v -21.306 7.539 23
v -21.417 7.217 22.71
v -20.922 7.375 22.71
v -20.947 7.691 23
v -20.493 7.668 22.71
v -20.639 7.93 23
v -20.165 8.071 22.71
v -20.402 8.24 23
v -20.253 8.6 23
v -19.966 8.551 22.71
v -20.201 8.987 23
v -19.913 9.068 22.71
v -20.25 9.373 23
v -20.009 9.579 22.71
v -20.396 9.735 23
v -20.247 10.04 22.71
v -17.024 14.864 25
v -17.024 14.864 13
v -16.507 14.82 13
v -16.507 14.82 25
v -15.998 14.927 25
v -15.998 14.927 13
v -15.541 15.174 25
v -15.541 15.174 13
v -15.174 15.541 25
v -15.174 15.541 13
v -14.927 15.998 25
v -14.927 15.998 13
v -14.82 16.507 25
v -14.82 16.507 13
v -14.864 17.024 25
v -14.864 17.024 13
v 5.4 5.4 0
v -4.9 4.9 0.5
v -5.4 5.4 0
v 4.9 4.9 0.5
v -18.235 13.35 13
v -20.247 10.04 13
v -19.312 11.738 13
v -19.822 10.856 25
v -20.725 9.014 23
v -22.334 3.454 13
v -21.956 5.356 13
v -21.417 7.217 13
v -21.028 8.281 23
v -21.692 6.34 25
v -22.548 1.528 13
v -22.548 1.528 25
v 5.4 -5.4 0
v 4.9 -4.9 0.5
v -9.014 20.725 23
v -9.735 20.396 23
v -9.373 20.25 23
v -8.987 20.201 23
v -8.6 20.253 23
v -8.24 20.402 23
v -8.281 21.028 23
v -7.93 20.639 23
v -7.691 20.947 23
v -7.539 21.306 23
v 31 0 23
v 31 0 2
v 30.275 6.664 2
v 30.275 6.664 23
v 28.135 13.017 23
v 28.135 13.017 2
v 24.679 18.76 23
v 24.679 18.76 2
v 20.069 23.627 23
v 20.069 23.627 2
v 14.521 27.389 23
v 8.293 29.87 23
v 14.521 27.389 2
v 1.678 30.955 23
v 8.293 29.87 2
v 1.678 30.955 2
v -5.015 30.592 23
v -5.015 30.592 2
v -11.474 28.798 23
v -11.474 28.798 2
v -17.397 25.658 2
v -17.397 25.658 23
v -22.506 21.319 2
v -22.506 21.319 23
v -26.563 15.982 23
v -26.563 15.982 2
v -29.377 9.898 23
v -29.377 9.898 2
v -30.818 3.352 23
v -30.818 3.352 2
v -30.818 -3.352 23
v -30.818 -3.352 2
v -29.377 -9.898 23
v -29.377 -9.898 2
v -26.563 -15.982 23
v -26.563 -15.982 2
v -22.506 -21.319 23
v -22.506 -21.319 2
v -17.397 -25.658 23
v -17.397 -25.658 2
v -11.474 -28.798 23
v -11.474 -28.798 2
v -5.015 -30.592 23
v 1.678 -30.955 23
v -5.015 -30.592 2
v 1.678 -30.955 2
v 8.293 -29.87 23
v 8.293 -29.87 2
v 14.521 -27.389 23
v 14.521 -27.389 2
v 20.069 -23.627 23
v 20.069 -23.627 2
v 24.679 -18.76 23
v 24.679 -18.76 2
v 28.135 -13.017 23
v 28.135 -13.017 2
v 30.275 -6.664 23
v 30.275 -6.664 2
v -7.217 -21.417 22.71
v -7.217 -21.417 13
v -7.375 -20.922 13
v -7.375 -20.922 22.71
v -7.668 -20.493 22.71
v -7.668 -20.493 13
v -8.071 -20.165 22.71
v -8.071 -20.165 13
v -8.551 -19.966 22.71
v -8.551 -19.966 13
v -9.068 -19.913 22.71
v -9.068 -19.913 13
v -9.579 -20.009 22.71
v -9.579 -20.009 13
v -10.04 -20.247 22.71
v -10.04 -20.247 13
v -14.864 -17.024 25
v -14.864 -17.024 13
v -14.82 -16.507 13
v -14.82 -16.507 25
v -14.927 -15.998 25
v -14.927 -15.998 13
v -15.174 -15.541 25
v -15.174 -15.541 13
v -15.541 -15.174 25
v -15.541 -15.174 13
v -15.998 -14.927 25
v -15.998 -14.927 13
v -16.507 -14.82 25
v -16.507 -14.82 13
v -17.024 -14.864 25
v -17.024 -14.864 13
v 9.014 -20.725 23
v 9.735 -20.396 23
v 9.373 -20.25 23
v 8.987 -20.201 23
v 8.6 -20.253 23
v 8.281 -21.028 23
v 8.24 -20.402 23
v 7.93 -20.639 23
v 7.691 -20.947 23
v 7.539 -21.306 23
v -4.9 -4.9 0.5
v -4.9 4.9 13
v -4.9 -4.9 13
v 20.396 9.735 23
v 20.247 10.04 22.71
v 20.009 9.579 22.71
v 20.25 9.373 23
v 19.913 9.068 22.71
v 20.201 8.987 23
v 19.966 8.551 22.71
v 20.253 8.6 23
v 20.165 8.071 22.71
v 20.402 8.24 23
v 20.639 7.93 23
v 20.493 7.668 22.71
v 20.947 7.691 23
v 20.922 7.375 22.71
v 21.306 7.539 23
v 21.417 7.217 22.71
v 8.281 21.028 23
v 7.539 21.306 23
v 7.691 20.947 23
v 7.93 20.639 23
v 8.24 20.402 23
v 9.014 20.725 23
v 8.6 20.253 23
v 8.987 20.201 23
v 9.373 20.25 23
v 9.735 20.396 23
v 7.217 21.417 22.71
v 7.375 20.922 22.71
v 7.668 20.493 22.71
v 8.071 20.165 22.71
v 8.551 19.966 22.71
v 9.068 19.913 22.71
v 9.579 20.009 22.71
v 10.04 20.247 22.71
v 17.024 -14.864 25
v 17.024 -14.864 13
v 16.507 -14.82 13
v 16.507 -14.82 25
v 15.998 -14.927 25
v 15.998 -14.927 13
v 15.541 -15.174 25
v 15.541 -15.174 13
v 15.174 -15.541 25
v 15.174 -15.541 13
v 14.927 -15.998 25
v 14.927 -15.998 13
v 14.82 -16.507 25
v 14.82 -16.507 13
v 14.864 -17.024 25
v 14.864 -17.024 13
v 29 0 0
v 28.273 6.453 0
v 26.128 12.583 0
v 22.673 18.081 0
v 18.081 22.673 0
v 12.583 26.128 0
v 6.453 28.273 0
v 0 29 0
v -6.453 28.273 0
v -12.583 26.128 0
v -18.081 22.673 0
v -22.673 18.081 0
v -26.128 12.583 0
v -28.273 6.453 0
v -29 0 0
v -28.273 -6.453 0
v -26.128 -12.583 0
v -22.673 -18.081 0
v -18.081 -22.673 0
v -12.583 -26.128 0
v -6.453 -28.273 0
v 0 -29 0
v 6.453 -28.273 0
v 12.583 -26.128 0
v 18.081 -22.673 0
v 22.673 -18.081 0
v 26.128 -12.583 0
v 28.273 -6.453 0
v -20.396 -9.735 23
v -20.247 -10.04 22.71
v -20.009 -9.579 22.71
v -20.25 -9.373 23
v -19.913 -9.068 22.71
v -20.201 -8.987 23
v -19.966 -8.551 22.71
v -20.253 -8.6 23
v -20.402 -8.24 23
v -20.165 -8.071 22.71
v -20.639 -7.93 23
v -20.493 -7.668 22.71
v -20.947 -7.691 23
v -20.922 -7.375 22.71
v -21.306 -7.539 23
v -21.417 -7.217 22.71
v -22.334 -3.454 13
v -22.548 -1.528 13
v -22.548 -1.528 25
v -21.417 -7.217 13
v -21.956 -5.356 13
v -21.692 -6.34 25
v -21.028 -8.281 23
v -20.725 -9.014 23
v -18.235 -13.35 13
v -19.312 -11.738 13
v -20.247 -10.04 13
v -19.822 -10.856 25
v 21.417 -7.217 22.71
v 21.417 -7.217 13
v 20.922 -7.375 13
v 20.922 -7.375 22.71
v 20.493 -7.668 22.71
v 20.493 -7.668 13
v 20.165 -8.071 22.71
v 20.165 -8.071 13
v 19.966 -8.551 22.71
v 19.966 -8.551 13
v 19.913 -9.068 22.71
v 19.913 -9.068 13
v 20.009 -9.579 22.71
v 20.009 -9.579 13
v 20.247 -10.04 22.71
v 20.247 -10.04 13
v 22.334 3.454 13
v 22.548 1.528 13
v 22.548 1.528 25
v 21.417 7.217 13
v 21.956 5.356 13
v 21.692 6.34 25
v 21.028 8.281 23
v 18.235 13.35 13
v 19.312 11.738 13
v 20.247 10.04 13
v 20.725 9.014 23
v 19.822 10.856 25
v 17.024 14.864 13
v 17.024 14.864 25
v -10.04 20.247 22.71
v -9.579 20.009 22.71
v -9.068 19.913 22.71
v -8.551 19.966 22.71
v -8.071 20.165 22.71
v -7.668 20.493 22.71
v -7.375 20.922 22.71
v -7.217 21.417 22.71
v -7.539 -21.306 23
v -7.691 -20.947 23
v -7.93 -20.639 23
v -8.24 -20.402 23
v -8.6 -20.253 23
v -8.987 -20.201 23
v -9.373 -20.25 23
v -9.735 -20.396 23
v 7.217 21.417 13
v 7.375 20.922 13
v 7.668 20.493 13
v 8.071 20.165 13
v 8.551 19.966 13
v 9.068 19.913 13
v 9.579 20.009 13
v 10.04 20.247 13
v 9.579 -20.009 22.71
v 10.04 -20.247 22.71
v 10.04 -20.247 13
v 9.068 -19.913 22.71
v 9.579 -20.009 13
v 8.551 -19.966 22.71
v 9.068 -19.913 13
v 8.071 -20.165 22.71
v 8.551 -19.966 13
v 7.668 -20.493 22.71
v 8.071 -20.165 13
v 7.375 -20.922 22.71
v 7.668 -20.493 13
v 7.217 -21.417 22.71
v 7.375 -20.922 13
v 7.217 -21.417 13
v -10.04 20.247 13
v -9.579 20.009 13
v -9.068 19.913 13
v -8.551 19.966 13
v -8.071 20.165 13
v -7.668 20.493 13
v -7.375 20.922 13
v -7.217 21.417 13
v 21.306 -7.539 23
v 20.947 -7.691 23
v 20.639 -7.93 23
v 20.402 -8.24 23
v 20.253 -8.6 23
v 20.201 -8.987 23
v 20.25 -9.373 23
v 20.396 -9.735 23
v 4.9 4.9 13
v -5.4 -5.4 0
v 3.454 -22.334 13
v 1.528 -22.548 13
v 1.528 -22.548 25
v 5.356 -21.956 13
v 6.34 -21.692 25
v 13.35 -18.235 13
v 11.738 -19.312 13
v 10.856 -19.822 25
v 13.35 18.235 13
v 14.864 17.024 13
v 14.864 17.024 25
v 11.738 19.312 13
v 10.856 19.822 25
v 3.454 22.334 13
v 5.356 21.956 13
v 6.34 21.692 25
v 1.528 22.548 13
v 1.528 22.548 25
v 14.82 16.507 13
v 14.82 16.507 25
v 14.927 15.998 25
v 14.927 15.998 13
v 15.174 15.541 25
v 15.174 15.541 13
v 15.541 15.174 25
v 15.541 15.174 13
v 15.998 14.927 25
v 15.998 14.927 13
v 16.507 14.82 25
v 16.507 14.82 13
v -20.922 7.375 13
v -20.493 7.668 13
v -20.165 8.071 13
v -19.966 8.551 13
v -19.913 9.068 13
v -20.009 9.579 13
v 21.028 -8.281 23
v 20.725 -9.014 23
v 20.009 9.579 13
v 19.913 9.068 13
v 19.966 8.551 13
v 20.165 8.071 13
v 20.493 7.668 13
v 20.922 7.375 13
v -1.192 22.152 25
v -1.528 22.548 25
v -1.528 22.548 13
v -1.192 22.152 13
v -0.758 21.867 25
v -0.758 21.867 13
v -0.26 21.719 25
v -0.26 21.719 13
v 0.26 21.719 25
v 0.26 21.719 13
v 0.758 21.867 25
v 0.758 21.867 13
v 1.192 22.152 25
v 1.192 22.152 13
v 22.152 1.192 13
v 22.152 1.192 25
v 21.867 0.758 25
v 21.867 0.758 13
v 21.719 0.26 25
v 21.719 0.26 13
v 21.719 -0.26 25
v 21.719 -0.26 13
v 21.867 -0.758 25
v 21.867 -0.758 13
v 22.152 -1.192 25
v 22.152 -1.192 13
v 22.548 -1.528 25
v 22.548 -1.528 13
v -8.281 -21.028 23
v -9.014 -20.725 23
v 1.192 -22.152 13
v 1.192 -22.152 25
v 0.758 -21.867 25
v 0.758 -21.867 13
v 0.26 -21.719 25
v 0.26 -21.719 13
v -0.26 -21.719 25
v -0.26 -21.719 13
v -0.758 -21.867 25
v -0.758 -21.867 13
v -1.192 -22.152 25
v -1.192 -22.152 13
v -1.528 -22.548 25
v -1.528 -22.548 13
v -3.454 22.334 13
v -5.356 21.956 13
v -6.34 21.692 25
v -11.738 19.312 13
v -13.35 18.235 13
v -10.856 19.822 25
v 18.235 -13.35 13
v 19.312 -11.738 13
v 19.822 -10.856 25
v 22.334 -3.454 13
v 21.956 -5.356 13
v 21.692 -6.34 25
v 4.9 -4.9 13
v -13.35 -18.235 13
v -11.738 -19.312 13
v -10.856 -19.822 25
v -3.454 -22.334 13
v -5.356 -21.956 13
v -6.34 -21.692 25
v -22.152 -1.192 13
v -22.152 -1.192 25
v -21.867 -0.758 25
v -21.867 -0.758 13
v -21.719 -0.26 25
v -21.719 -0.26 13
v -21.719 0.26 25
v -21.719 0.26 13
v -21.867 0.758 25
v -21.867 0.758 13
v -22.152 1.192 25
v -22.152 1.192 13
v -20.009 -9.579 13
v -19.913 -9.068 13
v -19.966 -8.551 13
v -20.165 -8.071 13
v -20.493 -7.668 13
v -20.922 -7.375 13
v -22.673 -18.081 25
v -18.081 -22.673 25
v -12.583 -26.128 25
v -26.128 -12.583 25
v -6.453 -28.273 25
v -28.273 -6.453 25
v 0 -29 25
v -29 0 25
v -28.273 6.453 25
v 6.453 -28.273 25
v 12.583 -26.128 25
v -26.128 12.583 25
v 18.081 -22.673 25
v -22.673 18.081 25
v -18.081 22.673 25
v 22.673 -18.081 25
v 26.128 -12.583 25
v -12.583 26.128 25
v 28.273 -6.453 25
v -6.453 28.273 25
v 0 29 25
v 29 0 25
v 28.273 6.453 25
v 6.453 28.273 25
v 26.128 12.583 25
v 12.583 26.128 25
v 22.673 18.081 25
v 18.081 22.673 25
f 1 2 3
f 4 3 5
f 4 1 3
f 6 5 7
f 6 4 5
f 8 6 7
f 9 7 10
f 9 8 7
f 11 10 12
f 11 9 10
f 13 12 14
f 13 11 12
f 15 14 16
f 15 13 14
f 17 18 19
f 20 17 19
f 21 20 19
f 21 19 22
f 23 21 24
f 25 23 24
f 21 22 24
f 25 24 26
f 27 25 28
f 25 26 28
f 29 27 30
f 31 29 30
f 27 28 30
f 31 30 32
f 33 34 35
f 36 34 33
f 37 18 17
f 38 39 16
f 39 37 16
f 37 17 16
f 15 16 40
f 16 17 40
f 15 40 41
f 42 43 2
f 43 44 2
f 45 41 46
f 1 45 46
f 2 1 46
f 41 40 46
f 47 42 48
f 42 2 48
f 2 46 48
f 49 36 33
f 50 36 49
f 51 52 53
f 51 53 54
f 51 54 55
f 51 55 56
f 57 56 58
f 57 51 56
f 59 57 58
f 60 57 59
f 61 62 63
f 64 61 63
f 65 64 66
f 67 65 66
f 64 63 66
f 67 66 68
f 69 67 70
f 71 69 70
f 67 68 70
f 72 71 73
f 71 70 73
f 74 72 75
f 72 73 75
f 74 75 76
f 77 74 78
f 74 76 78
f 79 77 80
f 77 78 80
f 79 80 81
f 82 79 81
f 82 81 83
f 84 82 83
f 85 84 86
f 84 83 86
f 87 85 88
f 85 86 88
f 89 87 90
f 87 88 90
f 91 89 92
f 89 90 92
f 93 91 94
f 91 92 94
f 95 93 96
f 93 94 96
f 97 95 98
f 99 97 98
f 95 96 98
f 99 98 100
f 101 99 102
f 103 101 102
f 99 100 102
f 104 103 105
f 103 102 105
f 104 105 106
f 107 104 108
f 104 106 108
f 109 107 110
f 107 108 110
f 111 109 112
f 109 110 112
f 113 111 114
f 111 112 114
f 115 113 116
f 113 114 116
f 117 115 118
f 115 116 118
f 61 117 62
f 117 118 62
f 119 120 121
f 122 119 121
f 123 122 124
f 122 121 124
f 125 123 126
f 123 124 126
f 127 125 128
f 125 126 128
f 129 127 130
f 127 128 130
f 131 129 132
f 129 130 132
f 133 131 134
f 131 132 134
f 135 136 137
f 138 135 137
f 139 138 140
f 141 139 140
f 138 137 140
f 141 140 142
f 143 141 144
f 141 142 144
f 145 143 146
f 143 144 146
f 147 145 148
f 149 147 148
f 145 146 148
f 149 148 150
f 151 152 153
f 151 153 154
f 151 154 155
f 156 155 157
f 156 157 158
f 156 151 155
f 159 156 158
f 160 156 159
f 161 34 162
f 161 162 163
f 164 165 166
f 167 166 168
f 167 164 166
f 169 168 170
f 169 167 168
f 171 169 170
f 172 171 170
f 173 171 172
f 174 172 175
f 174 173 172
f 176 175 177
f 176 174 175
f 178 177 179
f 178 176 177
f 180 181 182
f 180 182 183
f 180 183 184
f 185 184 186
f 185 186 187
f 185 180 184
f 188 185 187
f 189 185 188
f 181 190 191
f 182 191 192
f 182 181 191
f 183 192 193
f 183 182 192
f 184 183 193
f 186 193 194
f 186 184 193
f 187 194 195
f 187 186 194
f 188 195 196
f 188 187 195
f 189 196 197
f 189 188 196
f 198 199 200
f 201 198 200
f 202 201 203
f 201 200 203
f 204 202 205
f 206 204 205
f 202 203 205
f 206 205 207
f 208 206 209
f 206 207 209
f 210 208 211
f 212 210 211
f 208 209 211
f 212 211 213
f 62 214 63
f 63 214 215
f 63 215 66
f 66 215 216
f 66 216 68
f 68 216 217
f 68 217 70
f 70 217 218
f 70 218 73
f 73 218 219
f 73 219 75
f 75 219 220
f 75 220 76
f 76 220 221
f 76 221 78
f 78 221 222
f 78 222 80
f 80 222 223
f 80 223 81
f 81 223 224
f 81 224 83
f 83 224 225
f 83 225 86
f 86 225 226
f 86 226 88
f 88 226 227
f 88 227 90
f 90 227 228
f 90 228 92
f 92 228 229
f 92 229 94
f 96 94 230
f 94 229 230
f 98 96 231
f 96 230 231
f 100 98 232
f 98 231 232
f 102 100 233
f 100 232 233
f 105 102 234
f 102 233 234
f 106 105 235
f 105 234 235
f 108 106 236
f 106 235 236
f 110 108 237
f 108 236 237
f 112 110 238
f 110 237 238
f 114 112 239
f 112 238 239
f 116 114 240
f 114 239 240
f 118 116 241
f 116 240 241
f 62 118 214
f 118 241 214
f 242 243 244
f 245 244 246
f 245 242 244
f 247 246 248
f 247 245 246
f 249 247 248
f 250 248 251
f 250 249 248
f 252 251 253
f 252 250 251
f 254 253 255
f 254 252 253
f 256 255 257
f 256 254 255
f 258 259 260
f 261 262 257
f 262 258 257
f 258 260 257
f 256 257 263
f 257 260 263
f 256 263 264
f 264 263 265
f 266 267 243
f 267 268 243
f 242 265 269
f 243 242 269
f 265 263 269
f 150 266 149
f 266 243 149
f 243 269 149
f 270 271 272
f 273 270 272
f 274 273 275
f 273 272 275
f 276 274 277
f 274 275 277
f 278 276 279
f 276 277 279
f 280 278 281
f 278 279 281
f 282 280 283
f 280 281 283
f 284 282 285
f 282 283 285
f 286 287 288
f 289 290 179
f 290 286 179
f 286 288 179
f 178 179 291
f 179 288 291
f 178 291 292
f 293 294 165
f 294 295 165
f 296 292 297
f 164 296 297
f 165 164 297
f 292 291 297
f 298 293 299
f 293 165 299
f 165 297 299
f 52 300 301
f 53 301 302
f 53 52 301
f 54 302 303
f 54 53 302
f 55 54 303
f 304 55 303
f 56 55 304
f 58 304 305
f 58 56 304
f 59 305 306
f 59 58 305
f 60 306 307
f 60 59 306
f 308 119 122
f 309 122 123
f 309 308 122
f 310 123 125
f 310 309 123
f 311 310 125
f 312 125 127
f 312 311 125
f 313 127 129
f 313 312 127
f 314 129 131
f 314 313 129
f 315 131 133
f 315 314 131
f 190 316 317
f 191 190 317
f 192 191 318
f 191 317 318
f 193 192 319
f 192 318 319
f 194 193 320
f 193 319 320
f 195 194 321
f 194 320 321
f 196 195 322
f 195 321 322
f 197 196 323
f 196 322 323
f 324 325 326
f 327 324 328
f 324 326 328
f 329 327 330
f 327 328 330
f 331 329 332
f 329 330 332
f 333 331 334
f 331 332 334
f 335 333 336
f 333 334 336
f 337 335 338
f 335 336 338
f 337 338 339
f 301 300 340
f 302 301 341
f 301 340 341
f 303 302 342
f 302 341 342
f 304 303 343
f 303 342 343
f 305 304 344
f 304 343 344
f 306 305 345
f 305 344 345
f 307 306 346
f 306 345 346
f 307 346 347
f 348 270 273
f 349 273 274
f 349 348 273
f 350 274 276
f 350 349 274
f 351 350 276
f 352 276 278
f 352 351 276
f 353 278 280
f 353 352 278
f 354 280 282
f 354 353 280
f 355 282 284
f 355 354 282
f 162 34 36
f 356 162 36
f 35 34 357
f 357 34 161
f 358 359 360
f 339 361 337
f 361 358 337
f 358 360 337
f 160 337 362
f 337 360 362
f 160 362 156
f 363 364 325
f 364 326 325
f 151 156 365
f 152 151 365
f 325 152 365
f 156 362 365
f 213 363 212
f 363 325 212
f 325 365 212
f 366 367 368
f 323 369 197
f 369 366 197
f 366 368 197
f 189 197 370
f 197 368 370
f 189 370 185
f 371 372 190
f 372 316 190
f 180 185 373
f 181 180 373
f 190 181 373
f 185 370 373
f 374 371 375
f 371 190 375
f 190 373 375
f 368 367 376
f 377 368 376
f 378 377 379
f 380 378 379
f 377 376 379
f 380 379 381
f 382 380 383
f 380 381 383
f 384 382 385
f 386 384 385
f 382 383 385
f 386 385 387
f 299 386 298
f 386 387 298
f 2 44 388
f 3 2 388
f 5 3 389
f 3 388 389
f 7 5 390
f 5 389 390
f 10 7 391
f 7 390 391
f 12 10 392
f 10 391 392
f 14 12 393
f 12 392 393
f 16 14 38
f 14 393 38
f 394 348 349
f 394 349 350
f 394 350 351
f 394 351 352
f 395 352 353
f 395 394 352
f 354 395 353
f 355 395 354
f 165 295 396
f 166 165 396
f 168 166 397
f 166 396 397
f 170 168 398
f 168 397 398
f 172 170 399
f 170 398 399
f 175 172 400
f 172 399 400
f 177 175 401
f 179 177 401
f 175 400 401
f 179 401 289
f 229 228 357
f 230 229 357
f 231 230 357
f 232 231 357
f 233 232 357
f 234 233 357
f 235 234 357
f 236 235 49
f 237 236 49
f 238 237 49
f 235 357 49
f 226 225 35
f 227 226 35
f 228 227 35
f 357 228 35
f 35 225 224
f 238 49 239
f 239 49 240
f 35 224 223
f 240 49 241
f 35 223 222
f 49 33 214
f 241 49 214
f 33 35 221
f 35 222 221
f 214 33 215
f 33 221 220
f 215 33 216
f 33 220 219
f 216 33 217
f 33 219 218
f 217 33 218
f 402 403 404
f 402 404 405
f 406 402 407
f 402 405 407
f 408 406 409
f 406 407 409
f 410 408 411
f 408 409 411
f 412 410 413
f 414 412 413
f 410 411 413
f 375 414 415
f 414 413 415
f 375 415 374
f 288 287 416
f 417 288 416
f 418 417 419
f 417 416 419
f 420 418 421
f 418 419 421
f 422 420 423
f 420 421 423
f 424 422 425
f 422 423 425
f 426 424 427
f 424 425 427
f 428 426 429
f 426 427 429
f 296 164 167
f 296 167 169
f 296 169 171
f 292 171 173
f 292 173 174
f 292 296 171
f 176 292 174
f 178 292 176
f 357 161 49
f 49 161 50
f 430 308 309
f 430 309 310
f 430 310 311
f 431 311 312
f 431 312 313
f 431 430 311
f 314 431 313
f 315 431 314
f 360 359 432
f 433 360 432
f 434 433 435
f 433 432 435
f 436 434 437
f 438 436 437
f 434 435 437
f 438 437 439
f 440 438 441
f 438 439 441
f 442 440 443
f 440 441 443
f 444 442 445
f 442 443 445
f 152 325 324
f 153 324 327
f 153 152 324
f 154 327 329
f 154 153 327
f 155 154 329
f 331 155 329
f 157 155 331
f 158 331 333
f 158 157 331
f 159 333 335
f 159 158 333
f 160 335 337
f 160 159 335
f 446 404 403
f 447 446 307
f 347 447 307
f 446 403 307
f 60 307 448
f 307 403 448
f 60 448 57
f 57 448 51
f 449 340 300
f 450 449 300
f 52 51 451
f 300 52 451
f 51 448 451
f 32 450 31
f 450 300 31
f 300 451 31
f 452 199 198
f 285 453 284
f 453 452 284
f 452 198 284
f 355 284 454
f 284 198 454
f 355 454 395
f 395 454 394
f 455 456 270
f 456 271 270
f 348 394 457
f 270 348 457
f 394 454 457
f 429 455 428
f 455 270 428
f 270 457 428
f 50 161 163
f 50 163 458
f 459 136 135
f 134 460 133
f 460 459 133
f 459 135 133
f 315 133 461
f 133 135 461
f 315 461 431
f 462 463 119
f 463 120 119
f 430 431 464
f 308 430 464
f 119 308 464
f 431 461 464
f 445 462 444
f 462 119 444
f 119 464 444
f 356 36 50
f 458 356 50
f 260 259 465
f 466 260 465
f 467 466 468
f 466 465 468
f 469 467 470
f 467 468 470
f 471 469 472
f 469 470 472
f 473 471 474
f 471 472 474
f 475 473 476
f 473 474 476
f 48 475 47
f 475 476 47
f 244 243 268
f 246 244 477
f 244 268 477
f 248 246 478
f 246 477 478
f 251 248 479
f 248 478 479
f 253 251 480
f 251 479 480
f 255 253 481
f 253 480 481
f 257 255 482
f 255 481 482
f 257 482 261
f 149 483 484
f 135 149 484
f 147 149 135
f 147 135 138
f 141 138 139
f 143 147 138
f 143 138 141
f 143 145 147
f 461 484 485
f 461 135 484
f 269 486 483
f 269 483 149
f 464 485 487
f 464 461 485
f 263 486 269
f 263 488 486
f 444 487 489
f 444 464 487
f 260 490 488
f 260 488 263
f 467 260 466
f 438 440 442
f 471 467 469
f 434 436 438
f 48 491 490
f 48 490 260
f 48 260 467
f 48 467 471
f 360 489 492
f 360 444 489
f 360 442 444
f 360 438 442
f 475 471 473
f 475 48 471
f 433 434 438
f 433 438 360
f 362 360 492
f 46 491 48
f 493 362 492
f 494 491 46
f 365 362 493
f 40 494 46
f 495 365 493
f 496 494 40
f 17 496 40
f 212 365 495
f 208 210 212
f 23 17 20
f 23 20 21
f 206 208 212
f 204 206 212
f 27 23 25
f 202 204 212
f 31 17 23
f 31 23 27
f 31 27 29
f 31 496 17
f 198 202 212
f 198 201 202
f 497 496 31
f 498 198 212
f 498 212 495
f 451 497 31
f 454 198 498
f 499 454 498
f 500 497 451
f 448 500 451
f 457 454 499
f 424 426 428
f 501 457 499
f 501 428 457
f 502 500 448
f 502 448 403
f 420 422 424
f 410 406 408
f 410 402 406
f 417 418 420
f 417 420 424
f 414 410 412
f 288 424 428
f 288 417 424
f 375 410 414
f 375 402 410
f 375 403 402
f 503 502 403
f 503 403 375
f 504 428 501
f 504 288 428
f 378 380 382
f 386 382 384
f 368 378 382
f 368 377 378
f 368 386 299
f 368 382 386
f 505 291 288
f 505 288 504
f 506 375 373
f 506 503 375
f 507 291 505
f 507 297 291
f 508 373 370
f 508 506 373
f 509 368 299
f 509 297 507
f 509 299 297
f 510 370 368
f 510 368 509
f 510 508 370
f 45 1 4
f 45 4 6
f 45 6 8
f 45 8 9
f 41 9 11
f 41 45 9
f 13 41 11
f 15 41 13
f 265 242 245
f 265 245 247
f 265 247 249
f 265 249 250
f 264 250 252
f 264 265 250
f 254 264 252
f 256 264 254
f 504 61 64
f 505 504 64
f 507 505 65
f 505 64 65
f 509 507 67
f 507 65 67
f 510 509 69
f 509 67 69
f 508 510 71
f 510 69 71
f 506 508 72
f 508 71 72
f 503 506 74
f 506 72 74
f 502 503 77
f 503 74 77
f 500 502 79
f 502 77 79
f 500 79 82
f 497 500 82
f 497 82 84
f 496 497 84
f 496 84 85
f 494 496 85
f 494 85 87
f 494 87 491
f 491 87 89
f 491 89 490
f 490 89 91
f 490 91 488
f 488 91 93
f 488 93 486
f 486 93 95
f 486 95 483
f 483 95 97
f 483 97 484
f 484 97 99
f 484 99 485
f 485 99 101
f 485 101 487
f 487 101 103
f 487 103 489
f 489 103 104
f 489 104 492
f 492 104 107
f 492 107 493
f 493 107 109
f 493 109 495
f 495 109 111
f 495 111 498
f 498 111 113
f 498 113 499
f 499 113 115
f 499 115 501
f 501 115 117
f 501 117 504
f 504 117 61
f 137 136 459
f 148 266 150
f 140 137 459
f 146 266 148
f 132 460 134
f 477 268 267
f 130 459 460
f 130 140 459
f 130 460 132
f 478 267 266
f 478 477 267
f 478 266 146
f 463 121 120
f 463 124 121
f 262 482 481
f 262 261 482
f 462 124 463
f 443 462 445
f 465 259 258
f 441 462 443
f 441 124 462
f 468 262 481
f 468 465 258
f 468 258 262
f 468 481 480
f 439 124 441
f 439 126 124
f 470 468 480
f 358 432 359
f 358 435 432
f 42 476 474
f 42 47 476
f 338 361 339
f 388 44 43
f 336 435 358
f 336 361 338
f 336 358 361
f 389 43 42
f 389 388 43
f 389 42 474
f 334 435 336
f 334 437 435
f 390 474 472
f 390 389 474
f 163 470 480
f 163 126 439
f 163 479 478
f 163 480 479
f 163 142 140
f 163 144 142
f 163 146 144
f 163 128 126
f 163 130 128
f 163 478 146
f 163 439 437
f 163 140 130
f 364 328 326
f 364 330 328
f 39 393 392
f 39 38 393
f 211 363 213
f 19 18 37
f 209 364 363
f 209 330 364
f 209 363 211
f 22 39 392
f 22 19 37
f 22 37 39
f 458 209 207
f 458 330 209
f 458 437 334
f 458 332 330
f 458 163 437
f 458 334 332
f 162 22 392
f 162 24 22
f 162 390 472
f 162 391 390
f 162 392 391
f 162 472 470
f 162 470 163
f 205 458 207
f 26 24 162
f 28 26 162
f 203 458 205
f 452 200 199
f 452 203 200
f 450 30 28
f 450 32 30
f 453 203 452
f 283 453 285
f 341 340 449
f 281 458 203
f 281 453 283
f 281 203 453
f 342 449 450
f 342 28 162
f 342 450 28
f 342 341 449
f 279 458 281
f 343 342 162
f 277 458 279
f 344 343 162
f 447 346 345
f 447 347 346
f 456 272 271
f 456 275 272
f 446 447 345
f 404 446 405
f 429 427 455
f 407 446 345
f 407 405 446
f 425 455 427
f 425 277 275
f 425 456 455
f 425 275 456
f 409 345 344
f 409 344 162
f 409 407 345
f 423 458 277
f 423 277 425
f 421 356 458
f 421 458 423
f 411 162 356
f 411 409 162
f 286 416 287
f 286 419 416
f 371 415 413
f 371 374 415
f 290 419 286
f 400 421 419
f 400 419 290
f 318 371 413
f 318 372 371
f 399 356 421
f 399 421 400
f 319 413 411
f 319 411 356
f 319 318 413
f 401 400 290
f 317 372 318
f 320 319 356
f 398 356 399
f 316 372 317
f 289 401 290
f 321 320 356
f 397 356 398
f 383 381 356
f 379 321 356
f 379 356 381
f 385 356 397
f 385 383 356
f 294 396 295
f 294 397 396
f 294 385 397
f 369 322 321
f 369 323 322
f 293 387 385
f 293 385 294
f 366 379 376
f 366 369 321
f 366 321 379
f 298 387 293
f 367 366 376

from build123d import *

# Parameters (mm, degrees)
SKETCH_R              = 31
PAD_DEPTH             = 25
SKETCH001_R           = 22.6
POCKET_DEPTH          = 12
SKETCH003_W           = 9.8
SKETCH003_H           = 9.8
POCKET001_DEPTH       = 25.001
SKETCH004_R           = 1.8
PAD001_DEPTH          = 12
POLARPATTERN_COUNT    = 8
SKETCH005_R           = 1.8
PAD002_DEPTH          = 10
POLARPATTERN001_COUNT = 16
CHAMFER_SIZE          = 2
CHAMFER001_SIZE       = 2
CHAMFER002_SIZE       = 0.5
CHAMFER003_SIZE       = 0.29


with BuildPart() as part:
    # Sketch → Pad (new body)
    with BuildSketch(Plane.XY):
        Circle(SKETCH_R)
    extrude(amount=PAD_DEPTH)

    # Sketch001 → Pocket (cut)
    with BuildSketch(Plane.XY.offset(25)):
        Circle(SKETCH001_R)
    extrude(amount=-POCKET_DEPTH, mode=Mode.SUBTRACT)

    # Sketch003 → Pocket001 (cut, through all)
    with BuildSketch(Plane(origin=(0, 0, 0), x_dir=(1, 0, 0), z_dir=(0, 0, -1))):
        Rectangle(SKETCH003_W, SKETCH003_H)
    extrude(amount=-POCKET001_DEPTH, mode=Mode.SUBTRACT)

    # Sketch004 → Pad001 (new body)
    with BuildSketch(Plane.XY.offset(13)):
        with Locations((0, 23.5)):
            Circle(SKETCH004_R)
    pad001 = extrude(amount=PAD001_DEPTH)

    # PolarPattern: Pad001 ×8 about axis
    polarpattern_axis = Axis((0, 0, 13), (0, 0, 1))
    for i in range(1, POLARPATTERN_COUNT):
        add(pad001.rotate(polarpattern_axis, i * 360 / POLARPATTERN_COUNT))

    # Sketch005 → Pad002 (new body)
    with BuildSketch(Plane.XY.offset(13)):
        with Locations((0, 23.5)):
            Circle(SKETCH005_R)
    pad002 = extrude(amount=PAD002_DEPTH)

    # PolarPattern001: Pad002 ×16 about axis
    polarpattern001_axis = Axis((0, 0, 13), (0, 0, 1))
    for i in range(1, POLARPATTERN001_COUNT):
        add(pad002.rotate(polarpattern001_axis, i * 360 / POLARPATTERN001_COUNT))

    # Chamfer
    chamfer_edges = [part.edges().sort_by_distance(p)[0] for p in [
        (-31, 0, 25),
    ]]
    chamfer(chamfer_edges, length=CHAMFER_SIZE)

    # Chamfer001
    chamfer001_edges = [part.edges().sort_by_distance(p)[0] for p in [
        (-31, 0, 0),
    ]]
    chamfer(chamfer001_edges, length=CHAMFER001_SIZE)

    # Chamfer002
    chamfer002_edges = [part.edges().sort_by_distance(p)[0] for p in [
        (-4.9, 0, 0),
        (0, 4.9, 0),
        (4.9, 0, 0),
        (0, -4.9, 0),
    ]]
    chamfer(chamfer002_edges, length=CHAMFER002_SIZE)

    # Chamfer003
    chamfer003_edges = [part.edges().sort_by_distance(p)[0] for p in [
        (8.30423, 20.048186, 23),
        (20.048186, 8.30423, 23),
        (20.048186, -8.30423, 23),
        (8.30423, -20.048186, 23),
        (-8.30423, -20.048186, 23),
        (-20.048186, -8.30423, 23),
        (-20.048186, 8.30423, 23),
        (-8.30423, 20.048186, 23),
    ]]
    chamfer(chamfer003_edges, length=CHAMFER003_SIZE)


solid = part.part
